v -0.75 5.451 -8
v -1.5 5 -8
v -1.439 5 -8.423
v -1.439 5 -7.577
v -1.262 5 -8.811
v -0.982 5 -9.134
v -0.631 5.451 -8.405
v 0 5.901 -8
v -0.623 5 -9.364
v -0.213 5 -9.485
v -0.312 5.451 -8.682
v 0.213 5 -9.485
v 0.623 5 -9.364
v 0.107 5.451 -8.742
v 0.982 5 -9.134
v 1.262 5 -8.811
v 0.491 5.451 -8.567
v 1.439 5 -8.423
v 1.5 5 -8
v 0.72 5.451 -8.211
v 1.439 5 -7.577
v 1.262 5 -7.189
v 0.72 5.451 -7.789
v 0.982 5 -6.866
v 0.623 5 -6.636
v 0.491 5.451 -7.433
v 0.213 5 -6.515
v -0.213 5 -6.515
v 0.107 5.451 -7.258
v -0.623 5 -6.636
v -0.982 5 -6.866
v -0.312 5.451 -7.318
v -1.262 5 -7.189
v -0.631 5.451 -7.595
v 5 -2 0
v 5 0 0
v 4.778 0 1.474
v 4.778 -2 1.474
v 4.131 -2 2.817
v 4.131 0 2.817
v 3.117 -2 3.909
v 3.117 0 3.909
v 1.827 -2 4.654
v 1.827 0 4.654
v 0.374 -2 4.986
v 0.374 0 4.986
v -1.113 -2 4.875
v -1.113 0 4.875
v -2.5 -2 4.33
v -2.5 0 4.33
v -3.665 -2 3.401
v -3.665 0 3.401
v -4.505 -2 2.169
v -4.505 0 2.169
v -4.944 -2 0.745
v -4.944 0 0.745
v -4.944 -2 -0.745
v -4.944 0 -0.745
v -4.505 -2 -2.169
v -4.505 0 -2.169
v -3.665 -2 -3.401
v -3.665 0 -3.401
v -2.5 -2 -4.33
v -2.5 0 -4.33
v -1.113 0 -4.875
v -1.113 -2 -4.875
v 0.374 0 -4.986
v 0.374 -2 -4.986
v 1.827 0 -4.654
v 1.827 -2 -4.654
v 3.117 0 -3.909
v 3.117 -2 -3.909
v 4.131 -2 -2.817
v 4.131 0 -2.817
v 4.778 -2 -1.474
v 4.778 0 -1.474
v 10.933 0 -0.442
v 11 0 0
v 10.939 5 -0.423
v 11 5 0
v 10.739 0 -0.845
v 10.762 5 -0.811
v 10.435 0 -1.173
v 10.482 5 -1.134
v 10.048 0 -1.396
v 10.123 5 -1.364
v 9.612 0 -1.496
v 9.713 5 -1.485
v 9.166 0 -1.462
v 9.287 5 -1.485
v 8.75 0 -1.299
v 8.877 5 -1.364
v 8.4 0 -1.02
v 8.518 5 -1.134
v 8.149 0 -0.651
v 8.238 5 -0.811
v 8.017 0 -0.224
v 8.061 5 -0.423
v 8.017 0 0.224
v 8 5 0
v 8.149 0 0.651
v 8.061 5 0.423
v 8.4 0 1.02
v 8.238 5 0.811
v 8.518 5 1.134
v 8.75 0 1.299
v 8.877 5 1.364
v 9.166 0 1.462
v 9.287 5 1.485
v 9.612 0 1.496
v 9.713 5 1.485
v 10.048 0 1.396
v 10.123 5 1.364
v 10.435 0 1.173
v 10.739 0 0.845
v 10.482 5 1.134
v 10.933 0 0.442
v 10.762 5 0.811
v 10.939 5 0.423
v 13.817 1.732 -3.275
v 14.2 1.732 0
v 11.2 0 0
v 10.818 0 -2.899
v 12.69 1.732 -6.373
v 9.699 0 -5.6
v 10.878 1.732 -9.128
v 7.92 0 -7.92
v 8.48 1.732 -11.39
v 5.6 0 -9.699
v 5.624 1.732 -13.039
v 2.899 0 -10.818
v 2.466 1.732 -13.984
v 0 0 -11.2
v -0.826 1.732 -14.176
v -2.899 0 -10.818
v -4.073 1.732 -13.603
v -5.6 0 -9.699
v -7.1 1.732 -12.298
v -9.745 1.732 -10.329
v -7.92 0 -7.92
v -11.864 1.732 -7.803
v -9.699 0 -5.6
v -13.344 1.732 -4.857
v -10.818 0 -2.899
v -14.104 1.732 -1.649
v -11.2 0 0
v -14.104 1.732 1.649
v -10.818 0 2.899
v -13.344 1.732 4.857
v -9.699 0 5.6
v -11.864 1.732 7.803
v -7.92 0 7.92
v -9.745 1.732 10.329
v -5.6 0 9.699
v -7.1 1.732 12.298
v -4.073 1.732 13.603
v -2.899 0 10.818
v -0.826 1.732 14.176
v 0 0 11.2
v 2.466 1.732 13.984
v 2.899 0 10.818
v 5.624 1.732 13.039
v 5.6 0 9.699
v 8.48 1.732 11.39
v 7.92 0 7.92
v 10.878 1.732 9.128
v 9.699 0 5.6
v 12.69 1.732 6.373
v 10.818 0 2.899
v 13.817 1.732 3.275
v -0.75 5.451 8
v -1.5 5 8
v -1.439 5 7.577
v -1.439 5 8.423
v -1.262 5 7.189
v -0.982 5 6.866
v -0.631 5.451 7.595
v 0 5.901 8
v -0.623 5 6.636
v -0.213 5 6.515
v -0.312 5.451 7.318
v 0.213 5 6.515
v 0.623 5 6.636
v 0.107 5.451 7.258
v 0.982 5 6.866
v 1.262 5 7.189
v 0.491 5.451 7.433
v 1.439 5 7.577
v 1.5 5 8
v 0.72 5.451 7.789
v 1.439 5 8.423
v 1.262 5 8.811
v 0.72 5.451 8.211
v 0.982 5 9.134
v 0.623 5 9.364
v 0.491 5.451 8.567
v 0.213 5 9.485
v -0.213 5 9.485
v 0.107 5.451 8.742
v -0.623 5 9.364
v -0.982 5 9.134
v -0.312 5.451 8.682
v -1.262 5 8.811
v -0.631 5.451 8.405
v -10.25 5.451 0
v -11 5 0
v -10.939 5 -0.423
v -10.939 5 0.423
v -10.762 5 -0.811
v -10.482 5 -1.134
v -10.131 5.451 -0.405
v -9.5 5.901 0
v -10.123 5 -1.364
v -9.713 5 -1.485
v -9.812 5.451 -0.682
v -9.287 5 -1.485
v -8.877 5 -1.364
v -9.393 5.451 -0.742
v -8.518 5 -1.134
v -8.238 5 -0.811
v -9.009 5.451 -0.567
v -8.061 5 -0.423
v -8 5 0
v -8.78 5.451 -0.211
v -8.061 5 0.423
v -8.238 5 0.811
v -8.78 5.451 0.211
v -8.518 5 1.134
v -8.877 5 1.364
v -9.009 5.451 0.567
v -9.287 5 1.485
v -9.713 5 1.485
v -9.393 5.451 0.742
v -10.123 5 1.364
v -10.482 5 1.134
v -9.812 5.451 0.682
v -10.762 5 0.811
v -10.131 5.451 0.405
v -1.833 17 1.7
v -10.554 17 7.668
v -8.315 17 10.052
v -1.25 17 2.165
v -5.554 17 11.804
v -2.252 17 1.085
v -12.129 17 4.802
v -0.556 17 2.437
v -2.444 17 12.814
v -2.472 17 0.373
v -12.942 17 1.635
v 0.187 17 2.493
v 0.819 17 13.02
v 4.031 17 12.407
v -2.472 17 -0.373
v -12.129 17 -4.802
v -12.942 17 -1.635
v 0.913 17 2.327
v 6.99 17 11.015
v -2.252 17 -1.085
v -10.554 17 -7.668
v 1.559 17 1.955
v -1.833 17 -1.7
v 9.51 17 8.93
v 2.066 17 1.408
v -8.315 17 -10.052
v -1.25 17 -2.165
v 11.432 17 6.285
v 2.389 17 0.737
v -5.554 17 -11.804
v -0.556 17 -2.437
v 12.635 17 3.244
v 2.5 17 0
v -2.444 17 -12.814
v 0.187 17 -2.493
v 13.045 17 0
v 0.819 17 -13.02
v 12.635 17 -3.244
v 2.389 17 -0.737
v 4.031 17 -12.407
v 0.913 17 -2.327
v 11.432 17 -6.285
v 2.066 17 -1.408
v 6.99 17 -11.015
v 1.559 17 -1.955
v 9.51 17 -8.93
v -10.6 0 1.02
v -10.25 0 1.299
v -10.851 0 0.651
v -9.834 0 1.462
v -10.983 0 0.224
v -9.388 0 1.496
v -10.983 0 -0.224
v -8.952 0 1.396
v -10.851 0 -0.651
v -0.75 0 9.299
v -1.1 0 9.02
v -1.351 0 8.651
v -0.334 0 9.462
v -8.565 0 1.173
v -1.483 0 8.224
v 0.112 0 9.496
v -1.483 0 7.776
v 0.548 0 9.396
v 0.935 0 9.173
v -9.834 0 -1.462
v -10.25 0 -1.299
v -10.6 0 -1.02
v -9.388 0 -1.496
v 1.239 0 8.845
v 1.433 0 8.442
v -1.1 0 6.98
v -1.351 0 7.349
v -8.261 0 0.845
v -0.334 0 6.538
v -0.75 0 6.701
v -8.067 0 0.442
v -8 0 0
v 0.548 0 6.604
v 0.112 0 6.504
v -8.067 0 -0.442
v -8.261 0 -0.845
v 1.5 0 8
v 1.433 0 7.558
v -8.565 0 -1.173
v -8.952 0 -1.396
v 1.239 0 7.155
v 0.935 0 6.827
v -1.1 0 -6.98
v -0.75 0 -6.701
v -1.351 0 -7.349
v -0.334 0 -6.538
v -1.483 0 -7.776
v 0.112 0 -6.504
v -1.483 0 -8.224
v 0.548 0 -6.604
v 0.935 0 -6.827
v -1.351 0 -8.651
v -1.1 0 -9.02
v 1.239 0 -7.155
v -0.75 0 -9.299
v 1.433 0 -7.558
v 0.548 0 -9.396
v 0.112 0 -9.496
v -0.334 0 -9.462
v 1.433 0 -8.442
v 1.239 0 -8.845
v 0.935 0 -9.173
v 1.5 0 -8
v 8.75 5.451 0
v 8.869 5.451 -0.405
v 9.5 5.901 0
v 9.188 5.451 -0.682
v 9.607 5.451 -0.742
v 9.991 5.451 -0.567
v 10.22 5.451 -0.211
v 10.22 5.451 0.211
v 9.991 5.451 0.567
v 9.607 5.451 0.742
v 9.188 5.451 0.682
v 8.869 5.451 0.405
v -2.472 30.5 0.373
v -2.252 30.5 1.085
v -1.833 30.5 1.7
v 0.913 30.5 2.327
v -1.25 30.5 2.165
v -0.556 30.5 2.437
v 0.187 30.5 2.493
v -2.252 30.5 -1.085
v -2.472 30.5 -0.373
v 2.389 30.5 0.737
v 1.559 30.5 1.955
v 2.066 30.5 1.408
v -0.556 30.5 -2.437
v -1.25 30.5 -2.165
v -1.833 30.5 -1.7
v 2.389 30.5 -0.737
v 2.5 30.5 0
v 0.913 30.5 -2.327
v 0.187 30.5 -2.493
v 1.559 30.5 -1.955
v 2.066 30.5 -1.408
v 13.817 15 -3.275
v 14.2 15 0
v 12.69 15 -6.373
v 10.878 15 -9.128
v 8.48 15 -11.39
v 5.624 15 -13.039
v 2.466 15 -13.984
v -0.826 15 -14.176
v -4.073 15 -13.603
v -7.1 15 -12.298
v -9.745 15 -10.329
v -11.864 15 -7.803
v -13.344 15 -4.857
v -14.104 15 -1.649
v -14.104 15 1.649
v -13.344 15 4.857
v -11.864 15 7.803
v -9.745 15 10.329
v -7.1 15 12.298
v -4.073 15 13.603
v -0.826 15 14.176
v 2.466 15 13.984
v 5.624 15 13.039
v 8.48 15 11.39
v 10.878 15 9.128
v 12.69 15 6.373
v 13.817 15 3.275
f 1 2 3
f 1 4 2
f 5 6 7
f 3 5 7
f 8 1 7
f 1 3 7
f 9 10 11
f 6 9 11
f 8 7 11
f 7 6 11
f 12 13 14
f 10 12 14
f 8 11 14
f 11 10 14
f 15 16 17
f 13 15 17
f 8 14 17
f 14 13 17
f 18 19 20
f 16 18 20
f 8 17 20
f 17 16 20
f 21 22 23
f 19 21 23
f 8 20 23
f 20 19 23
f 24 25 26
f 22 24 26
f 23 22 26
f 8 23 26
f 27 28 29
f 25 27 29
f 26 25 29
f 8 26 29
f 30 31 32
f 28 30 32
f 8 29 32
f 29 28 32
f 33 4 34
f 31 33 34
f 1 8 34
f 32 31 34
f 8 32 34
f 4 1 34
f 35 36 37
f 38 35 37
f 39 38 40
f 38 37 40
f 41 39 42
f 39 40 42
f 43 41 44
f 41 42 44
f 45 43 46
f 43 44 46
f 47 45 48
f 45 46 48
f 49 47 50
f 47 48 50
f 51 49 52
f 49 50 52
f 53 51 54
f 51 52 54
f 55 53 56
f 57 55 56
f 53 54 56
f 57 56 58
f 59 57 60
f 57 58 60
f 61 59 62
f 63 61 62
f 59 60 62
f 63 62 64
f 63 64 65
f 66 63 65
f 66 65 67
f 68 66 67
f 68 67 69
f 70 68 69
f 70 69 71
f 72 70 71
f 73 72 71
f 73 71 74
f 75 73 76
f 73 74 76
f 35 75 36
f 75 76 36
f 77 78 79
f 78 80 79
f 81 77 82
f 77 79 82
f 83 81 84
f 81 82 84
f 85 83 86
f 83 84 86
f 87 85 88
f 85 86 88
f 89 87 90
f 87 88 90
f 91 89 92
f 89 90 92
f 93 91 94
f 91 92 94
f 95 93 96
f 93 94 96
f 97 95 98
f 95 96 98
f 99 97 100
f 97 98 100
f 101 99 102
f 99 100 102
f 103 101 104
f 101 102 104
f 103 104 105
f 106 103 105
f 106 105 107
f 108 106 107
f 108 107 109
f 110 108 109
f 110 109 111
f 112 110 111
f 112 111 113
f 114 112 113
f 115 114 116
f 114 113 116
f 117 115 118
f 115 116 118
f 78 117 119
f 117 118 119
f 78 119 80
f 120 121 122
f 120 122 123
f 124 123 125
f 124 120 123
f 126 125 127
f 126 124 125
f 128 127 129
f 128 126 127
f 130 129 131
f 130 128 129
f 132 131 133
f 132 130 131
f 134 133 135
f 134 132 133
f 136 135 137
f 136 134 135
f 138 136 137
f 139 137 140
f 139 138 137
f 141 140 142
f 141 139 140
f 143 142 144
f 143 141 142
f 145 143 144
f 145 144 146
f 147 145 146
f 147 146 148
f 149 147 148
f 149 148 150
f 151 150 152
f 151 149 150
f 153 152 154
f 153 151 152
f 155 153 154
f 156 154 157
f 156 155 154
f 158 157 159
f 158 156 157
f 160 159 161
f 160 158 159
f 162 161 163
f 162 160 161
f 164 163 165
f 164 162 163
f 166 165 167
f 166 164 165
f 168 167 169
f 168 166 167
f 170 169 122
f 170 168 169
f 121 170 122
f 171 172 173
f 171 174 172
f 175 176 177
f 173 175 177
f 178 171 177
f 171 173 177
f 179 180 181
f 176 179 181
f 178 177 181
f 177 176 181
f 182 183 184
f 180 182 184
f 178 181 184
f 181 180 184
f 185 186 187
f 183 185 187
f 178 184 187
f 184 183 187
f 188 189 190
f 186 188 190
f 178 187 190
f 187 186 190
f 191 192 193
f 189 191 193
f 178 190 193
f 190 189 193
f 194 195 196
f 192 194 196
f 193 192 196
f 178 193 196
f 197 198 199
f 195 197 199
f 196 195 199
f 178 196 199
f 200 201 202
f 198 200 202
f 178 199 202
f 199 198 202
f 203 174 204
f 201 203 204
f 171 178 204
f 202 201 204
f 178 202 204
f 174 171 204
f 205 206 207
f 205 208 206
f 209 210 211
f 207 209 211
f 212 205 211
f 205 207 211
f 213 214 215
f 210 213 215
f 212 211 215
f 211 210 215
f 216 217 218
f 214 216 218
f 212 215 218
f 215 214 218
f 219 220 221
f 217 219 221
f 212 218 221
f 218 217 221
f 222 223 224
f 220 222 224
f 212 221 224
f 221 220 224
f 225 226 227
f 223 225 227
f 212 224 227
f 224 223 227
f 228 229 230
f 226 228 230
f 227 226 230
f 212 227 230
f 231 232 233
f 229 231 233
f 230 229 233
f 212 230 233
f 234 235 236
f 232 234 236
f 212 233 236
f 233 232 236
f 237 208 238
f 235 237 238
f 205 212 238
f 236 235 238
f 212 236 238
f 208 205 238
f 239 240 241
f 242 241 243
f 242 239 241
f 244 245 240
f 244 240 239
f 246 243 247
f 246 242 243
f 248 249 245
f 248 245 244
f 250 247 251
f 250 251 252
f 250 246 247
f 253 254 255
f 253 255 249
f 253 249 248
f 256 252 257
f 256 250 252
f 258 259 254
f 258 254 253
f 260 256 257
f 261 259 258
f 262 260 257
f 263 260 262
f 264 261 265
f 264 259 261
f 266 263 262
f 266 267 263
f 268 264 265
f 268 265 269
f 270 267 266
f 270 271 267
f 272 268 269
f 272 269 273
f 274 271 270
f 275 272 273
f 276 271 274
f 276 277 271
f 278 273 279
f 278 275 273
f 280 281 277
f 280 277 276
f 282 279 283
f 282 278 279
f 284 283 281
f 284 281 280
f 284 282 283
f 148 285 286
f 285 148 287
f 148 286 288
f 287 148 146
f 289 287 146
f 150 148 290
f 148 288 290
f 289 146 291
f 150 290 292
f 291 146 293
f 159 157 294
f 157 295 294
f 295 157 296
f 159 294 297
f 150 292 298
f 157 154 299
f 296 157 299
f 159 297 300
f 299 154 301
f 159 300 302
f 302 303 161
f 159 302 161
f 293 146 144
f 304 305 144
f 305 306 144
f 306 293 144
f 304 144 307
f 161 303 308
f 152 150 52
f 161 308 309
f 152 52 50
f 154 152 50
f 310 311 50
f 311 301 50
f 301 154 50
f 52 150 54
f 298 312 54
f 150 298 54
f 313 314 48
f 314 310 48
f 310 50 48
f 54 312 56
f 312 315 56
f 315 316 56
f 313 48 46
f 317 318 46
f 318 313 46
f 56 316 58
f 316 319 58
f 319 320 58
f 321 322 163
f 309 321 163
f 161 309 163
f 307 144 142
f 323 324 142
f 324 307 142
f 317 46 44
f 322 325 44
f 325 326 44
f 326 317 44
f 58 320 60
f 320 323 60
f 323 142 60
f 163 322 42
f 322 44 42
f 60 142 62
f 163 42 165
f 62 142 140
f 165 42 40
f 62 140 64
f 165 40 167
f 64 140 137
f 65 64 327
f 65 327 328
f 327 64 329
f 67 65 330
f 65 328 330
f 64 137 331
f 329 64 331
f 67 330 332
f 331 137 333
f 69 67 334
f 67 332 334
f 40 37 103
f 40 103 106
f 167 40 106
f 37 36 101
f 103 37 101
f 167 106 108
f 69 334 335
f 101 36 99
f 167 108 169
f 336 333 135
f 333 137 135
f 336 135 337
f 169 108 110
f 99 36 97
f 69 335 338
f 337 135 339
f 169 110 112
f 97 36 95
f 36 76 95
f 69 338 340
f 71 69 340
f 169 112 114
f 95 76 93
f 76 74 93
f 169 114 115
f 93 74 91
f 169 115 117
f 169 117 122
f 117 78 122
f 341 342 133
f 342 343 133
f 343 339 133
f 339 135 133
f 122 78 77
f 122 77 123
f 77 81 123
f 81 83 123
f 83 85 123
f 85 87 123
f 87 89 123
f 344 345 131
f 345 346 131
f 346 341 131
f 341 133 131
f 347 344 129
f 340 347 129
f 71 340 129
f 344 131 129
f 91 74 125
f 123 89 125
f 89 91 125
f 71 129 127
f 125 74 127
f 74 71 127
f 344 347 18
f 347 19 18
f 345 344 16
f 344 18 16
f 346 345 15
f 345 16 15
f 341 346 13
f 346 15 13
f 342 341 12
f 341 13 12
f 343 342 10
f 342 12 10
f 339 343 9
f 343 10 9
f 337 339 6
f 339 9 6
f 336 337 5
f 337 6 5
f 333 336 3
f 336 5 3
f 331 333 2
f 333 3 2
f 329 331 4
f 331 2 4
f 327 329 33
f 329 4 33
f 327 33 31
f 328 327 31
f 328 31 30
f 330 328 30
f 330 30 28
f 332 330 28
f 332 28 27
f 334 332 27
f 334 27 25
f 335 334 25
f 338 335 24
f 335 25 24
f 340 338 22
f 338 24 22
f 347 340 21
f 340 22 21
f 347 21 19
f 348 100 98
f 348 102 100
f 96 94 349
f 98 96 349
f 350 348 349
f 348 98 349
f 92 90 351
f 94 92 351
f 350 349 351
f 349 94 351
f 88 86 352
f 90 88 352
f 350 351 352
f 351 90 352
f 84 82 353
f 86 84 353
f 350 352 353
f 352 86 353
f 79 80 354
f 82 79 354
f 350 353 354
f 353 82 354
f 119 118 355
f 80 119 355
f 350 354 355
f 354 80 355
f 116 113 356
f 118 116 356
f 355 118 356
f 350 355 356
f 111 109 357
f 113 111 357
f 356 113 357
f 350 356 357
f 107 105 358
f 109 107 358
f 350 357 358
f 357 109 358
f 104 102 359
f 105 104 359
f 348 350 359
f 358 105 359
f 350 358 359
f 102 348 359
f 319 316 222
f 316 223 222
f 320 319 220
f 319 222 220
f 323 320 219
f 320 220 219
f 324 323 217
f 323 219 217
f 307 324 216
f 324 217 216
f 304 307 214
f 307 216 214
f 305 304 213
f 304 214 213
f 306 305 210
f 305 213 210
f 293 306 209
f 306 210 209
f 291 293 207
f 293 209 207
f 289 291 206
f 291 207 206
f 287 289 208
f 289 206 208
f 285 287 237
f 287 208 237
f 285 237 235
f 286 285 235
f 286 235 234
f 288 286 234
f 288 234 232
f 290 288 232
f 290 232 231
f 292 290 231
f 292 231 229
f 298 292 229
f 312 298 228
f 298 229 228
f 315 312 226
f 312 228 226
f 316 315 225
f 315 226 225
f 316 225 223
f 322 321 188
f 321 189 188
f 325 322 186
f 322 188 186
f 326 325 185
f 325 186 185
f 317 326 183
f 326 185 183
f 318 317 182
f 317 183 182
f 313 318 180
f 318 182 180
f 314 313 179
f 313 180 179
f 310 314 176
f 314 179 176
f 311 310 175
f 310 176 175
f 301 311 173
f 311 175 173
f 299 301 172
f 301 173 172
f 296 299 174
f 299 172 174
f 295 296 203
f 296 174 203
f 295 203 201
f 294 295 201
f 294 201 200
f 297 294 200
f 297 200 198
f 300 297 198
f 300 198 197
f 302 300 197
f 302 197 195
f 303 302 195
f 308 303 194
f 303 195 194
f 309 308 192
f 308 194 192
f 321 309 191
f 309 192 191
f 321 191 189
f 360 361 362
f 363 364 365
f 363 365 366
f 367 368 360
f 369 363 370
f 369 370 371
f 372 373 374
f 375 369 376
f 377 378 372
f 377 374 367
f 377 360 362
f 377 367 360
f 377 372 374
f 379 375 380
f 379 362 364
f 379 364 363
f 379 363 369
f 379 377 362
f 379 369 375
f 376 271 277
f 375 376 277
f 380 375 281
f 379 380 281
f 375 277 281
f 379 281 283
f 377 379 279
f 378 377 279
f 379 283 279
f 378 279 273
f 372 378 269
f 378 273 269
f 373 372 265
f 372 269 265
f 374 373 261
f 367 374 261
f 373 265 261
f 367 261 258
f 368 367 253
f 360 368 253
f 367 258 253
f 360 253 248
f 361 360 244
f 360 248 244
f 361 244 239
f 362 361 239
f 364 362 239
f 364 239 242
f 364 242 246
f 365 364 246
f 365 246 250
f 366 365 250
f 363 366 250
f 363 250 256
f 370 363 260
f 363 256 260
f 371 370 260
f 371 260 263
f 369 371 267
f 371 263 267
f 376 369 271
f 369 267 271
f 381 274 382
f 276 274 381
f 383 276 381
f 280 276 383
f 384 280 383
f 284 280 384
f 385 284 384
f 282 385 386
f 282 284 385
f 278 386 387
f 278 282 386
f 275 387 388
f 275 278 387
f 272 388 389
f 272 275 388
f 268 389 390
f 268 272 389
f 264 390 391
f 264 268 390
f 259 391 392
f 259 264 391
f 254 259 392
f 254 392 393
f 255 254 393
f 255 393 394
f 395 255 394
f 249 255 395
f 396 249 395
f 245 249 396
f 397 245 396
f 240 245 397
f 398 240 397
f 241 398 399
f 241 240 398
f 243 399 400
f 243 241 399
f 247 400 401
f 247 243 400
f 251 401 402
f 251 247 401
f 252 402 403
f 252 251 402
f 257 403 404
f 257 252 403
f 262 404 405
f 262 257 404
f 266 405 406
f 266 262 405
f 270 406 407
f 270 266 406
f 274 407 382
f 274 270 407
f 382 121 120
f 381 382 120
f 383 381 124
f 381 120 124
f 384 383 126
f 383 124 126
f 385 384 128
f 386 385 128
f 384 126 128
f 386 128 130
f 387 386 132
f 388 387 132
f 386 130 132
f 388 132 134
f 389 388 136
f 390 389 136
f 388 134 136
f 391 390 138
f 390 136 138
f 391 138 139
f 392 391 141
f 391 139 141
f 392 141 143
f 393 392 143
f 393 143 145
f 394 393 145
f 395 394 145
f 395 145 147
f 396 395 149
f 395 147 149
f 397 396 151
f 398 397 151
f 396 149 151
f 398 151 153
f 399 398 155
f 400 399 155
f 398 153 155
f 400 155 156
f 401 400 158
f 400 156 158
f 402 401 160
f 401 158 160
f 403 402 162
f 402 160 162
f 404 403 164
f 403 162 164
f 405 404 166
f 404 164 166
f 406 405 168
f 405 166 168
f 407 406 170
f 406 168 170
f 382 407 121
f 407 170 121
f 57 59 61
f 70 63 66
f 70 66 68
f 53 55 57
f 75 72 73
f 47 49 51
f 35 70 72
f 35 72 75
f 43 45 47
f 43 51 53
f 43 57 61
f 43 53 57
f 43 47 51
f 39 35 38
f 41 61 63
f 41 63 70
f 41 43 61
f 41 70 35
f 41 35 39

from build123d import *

# Parameters (mm, degrees)
SKETCH1_R                    = 14.2
BOSS_EXTRUDE1_DEPTH          = 17
SKETCH2_R                    = 2.5
BOSS_EXTRUDE2_DEPTH          = 13.5
CHAMFER1_SIZE                = 2
CHAMFER1_SIZE2               = 1.154700538
F_3_0_3_DIAMETER_HOLE1_D     = 3
F_3_0_3_DIAMETER_HOLE1_DEPTH = 5
F_3_0_3_DIAMETER_HOLE1_TIP   = 0.901290929
CHAMFER3_SIZE                = 3
CHAMFER3_SIZE2               = 1.732050808
SKETCH6_R                    = 5
BOSS_EXTRUDE3_DEPTH          = 2


with BuildPart() as part:
    # Sketch1 → Boss-Extrude1 (new body)
    with BuildSketch(Plane(origin=(0, 0, 0), x_dir=(1, 0, 0), z_dir=(0, 1, 0))):
        Circle(SKETCH1_R)
    extrude(amount=BOSS_EXTRUDE1_DEPTH)

    # Sketch2 → Boss-Extrude2 (add)
    with BuildSketch(Plane(origin=(0, 17, 0), x_dir=(1, 0, 0), z_dir=(0, 1, 0))):
        Circle(SKETCH2_R)
    extrude(amount=BOSS_EXTRUDE2_DEPTH)

    # Chamfer1
    chamfer1_edges = [part.edges().sort_by_distance(p)[0] for p in [
        (-14.2, 17, 0),
    ]]
    chamfer1_side = [part.faces().sort_by_distance(p)[0] for p in [
        (-14.2, 8.5, 0),
    ]]
    chamfer(chamfer1_edges, length=CHAMFER1_SIZE, length2=CHAMFER1_SIZE2, reference=chamfer1_side[0])

    # Ø3.0 (3) Diameter Hole1
    with Locations(Plane(origin=(0, 0, 0), x_dir=(-1, 0, 0), z_dir=(0, -1, 0))):
        with Locations((0, -8), (-9.5, 0), (0, 8), (9.5, 0)):
            Hole(F_3_0_3_DIAMETER_HOLE1_D / 2, depth=F_3_0_3_DIAMETER_HOLE1_DEPTH)
            with Locations((0, 0, -(F_3_0_3_DIAMETER_HOLE1_DEPTH + F_3_0_3_DIAMETER_HOLE1_TIP / 2))):  # 118° drill point
                Cone(0, F_3_0_3_DIAMETER_HOLE1_D / 2, F_3_0_3_DIAMETER_HOLE1_TIP, mode=Mode.SUBTRACT)

    # Chamfer3
    chamfer3_edges = [part.edges().sort_by_distance(p)[0] for p in [
        (-14.2, 0, 0),
    ]]
    chamfer3_side = [part.faces().sort_by_distance(p)[0] for p in [
        (0, 0, 0),
    ]]
    chamfer(chamfer3_edges, length=CHAMFER3_SIZE, length2=CHAMFER3_SIZE2, reference=chamfer3_side[0])

    # Sketch6 → Boss-Extrude3 (add)
    with BuildSketch(Plane.XZ):
        Circle(SKETCH6_R)
    extrude(amount=BOSS_EXTRUDE3_DEPTH)


solid = part.part
